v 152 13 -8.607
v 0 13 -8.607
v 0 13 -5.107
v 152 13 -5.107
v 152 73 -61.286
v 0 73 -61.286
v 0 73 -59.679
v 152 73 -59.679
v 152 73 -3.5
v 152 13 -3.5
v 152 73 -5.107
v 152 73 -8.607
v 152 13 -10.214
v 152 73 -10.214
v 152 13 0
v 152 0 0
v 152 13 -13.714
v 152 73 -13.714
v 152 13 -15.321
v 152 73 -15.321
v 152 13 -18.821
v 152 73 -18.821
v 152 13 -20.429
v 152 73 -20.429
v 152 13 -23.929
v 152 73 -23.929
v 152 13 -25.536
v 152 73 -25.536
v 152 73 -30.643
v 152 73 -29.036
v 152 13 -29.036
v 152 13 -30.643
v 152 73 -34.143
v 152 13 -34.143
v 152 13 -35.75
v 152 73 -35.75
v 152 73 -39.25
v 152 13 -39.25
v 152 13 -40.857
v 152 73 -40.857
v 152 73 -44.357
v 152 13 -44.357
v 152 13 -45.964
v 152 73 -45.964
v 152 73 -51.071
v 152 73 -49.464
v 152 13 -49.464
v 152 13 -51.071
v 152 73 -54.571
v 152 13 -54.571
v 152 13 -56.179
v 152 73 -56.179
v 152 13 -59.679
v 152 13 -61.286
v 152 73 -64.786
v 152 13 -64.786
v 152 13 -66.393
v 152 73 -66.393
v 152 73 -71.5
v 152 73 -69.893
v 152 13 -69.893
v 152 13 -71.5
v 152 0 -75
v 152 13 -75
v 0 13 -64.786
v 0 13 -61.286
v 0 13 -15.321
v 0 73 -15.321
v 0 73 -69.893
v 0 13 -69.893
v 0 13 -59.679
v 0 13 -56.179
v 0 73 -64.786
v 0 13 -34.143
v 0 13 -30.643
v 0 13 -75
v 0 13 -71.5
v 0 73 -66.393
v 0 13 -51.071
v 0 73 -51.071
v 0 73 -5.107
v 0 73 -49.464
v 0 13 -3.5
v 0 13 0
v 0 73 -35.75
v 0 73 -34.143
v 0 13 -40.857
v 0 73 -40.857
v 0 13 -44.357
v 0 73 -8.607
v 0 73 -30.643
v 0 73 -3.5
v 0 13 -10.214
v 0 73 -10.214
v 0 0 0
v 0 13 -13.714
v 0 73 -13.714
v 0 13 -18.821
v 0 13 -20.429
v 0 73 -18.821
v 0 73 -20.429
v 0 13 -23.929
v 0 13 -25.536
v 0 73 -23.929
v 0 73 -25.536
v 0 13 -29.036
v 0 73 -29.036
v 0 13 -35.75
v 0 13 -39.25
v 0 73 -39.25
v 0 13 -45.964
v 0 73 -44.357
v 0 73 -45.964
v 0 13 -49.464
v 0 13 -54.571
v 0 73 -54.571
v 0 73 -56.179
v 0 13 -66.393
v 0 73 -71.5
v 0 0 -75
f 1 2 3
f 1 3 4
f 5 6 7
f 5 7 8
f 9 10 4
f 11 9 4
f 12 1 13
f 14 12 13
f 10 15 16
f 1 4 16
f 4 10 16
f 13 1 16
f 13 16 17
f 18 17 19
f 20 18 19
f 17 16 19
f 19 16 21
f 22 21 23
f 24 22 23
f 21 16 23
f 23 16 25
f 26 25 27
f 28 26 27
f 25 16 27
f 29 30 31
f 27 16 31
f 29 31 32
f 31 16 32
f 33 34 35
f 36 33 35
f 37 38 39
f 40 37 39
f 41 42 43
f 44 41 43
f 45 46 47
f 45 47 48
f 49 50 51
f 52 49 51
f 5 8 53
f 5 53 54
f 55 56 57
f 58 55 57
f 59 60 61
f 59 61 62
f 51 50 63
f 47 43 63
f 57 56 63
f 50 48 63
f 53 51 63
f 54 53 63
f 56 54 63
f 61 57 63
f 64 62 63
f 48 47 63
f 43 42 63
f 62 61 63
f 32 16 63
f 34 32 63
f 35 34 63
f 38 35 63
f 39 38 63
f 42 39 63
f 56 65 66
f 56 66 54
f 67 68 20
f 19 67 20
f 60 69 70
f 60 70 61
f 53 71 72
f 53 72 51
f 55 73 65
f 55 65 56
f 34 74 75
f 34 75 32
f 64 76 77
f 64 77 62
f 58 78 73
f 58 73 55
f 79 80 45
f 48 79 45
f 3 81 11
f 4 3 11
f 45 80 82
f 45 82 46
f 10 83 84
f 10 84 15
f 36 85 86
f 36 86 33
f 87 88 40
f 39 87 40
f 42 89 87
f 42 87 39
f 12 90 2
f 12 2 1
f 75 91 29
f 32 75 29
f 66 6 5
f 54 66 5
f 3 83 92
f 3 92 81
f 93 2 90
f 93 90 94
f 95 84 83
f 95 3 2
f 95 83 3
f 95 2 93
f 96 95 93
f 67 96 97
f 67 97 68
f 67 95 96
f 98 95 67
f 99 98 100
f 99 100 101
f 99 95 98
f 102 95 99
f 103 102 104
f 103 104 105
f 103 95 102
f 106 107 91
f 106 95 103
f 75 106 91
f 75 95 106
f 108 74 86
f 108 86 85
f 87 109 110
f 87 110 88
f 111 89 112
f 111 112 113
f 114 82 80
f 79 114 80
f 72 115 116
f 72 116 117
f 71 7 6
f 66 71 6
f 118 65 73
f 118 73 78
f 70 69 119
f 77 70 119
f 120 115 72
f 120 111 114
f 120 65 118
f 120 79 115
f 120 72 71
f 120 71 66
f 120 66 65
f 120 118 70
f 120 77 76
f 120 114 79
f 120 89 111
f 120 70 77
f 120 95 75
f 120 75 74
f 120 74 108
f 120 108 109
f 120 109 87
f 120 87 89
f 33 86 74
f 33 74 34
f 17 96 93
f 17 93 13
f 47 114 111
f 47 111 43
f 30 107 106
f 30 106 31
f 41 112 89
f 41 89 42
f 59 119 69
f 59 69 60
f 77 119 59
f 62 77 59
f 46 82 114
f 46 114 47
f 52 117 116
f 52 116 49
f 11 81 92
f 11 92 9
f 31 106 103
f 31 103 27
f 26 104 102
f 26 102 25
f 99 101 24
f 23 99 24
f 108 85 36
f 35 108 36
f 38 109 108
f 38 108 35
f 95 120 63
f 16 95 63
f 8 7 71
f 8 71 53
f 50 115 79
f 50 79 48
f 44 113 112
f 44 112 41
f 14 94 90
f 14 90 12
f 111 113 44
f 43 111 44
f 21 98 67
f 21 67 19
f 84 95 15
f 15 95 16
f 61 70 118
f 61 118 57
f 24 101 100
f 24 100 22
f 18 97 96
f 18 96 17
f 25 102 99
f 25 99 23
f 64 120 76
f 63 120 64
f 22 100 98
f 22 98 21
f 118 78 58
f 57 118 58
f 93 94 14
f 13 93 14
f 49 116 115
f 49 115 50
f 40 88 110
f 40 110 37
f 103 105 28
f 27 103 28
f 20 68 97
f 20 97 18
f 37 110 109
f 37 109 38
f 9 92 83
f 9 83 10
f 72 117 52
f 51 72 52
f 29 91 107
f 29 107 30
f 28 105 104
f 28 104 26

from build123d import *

# Parameters (mm, degrees)
SKETCH1_W           = 152
SKETCH1_H           = 75
BOSS_EXTRUDE1_DEPTH = 73
SKETCH2_W           = 152
SKETCH2_H           = 3.5
CUT_EXTRUDE1_DEPTH  = 60


with BuildPart() as part:
    # Sketch1 → Boss-Extrude1 (new body)
    with BuildSketch(Plane(origin=(0, 0, 0), x_dir=(1, 0, 0), z_dir=(0, 1, 0))):
        with Locations((76, 37.5)):
            Rectangle(SKETCH1_W, SKETCH1_H)
    extrude(amount=BOSS_EXTRUDE1_DEPTH)

    # Sketch2 → Cut-Extrude1 (cut)
    with BuildSketch(Plane(origin=(0, 73, 0), x_dir=(1, 0, 0), z_dir=(0, 1, 0))):
        with Locations((76, 1.75)):
            Rectangle(SKETCH2_W, SKETCH2_H)
        with Locations((76, 6.857142857)):
            Rectangle(SKETCH2_W, SKETCH2_H)
        with Locations((76, 11.964285714)):
            Rectangle(SKETCH2_W, SKETCH2_H)
        with Locations((76, 17.071428571)):
            Rectangle(SKETCH2_W, SKETCH2_H)
        with Locations((76, 22.178571429)):
            Rectangle(SKETCH2_W, SKETCH2_H)
        with Locations((76, 27.285714286)):
            Rectangle(SKETCH2_W, SKETCH2_H)
        with Locations((76, 32.392857143)):
            Rectangle(SKETCH2_W, SKETCH2_H)
        with Locations((76, 37.5)):
            Rectangle(SKETCH2_W, SKETCH2_H)
        with Locations((76, 42.607142857)):
            Rectangle(SKETCH2_W, SKETCH2_H)
        with Locations((76, 47.714285714)):
            Rectangle(SKETCH2_W, SKETCH2_H)
        with Locations((76, 52.821428571)):
            Rectangle(SKETCH2_W, SKETCH2_H)
        with Locations((76, 57.928571429)):
            Rectangle(SKETCH2_W, SKETCH2_H)
        with Locations((76, 63.035714286)):
            Rectangle(SKETCH2_W, SKETCH2_H)
        with Locations((76, 68.142857143)):
            Rectangle(SKETCH2_W, SKETCH2_H)
        with Locations((76, 73.25)):
            Rectangle(SKETCH2_W, SKETCH2_H)
    extrude(amount=-CUT_EXTRUDE1_DEPTH, mode=Mode.SUBTRACT)


solid = part.part
